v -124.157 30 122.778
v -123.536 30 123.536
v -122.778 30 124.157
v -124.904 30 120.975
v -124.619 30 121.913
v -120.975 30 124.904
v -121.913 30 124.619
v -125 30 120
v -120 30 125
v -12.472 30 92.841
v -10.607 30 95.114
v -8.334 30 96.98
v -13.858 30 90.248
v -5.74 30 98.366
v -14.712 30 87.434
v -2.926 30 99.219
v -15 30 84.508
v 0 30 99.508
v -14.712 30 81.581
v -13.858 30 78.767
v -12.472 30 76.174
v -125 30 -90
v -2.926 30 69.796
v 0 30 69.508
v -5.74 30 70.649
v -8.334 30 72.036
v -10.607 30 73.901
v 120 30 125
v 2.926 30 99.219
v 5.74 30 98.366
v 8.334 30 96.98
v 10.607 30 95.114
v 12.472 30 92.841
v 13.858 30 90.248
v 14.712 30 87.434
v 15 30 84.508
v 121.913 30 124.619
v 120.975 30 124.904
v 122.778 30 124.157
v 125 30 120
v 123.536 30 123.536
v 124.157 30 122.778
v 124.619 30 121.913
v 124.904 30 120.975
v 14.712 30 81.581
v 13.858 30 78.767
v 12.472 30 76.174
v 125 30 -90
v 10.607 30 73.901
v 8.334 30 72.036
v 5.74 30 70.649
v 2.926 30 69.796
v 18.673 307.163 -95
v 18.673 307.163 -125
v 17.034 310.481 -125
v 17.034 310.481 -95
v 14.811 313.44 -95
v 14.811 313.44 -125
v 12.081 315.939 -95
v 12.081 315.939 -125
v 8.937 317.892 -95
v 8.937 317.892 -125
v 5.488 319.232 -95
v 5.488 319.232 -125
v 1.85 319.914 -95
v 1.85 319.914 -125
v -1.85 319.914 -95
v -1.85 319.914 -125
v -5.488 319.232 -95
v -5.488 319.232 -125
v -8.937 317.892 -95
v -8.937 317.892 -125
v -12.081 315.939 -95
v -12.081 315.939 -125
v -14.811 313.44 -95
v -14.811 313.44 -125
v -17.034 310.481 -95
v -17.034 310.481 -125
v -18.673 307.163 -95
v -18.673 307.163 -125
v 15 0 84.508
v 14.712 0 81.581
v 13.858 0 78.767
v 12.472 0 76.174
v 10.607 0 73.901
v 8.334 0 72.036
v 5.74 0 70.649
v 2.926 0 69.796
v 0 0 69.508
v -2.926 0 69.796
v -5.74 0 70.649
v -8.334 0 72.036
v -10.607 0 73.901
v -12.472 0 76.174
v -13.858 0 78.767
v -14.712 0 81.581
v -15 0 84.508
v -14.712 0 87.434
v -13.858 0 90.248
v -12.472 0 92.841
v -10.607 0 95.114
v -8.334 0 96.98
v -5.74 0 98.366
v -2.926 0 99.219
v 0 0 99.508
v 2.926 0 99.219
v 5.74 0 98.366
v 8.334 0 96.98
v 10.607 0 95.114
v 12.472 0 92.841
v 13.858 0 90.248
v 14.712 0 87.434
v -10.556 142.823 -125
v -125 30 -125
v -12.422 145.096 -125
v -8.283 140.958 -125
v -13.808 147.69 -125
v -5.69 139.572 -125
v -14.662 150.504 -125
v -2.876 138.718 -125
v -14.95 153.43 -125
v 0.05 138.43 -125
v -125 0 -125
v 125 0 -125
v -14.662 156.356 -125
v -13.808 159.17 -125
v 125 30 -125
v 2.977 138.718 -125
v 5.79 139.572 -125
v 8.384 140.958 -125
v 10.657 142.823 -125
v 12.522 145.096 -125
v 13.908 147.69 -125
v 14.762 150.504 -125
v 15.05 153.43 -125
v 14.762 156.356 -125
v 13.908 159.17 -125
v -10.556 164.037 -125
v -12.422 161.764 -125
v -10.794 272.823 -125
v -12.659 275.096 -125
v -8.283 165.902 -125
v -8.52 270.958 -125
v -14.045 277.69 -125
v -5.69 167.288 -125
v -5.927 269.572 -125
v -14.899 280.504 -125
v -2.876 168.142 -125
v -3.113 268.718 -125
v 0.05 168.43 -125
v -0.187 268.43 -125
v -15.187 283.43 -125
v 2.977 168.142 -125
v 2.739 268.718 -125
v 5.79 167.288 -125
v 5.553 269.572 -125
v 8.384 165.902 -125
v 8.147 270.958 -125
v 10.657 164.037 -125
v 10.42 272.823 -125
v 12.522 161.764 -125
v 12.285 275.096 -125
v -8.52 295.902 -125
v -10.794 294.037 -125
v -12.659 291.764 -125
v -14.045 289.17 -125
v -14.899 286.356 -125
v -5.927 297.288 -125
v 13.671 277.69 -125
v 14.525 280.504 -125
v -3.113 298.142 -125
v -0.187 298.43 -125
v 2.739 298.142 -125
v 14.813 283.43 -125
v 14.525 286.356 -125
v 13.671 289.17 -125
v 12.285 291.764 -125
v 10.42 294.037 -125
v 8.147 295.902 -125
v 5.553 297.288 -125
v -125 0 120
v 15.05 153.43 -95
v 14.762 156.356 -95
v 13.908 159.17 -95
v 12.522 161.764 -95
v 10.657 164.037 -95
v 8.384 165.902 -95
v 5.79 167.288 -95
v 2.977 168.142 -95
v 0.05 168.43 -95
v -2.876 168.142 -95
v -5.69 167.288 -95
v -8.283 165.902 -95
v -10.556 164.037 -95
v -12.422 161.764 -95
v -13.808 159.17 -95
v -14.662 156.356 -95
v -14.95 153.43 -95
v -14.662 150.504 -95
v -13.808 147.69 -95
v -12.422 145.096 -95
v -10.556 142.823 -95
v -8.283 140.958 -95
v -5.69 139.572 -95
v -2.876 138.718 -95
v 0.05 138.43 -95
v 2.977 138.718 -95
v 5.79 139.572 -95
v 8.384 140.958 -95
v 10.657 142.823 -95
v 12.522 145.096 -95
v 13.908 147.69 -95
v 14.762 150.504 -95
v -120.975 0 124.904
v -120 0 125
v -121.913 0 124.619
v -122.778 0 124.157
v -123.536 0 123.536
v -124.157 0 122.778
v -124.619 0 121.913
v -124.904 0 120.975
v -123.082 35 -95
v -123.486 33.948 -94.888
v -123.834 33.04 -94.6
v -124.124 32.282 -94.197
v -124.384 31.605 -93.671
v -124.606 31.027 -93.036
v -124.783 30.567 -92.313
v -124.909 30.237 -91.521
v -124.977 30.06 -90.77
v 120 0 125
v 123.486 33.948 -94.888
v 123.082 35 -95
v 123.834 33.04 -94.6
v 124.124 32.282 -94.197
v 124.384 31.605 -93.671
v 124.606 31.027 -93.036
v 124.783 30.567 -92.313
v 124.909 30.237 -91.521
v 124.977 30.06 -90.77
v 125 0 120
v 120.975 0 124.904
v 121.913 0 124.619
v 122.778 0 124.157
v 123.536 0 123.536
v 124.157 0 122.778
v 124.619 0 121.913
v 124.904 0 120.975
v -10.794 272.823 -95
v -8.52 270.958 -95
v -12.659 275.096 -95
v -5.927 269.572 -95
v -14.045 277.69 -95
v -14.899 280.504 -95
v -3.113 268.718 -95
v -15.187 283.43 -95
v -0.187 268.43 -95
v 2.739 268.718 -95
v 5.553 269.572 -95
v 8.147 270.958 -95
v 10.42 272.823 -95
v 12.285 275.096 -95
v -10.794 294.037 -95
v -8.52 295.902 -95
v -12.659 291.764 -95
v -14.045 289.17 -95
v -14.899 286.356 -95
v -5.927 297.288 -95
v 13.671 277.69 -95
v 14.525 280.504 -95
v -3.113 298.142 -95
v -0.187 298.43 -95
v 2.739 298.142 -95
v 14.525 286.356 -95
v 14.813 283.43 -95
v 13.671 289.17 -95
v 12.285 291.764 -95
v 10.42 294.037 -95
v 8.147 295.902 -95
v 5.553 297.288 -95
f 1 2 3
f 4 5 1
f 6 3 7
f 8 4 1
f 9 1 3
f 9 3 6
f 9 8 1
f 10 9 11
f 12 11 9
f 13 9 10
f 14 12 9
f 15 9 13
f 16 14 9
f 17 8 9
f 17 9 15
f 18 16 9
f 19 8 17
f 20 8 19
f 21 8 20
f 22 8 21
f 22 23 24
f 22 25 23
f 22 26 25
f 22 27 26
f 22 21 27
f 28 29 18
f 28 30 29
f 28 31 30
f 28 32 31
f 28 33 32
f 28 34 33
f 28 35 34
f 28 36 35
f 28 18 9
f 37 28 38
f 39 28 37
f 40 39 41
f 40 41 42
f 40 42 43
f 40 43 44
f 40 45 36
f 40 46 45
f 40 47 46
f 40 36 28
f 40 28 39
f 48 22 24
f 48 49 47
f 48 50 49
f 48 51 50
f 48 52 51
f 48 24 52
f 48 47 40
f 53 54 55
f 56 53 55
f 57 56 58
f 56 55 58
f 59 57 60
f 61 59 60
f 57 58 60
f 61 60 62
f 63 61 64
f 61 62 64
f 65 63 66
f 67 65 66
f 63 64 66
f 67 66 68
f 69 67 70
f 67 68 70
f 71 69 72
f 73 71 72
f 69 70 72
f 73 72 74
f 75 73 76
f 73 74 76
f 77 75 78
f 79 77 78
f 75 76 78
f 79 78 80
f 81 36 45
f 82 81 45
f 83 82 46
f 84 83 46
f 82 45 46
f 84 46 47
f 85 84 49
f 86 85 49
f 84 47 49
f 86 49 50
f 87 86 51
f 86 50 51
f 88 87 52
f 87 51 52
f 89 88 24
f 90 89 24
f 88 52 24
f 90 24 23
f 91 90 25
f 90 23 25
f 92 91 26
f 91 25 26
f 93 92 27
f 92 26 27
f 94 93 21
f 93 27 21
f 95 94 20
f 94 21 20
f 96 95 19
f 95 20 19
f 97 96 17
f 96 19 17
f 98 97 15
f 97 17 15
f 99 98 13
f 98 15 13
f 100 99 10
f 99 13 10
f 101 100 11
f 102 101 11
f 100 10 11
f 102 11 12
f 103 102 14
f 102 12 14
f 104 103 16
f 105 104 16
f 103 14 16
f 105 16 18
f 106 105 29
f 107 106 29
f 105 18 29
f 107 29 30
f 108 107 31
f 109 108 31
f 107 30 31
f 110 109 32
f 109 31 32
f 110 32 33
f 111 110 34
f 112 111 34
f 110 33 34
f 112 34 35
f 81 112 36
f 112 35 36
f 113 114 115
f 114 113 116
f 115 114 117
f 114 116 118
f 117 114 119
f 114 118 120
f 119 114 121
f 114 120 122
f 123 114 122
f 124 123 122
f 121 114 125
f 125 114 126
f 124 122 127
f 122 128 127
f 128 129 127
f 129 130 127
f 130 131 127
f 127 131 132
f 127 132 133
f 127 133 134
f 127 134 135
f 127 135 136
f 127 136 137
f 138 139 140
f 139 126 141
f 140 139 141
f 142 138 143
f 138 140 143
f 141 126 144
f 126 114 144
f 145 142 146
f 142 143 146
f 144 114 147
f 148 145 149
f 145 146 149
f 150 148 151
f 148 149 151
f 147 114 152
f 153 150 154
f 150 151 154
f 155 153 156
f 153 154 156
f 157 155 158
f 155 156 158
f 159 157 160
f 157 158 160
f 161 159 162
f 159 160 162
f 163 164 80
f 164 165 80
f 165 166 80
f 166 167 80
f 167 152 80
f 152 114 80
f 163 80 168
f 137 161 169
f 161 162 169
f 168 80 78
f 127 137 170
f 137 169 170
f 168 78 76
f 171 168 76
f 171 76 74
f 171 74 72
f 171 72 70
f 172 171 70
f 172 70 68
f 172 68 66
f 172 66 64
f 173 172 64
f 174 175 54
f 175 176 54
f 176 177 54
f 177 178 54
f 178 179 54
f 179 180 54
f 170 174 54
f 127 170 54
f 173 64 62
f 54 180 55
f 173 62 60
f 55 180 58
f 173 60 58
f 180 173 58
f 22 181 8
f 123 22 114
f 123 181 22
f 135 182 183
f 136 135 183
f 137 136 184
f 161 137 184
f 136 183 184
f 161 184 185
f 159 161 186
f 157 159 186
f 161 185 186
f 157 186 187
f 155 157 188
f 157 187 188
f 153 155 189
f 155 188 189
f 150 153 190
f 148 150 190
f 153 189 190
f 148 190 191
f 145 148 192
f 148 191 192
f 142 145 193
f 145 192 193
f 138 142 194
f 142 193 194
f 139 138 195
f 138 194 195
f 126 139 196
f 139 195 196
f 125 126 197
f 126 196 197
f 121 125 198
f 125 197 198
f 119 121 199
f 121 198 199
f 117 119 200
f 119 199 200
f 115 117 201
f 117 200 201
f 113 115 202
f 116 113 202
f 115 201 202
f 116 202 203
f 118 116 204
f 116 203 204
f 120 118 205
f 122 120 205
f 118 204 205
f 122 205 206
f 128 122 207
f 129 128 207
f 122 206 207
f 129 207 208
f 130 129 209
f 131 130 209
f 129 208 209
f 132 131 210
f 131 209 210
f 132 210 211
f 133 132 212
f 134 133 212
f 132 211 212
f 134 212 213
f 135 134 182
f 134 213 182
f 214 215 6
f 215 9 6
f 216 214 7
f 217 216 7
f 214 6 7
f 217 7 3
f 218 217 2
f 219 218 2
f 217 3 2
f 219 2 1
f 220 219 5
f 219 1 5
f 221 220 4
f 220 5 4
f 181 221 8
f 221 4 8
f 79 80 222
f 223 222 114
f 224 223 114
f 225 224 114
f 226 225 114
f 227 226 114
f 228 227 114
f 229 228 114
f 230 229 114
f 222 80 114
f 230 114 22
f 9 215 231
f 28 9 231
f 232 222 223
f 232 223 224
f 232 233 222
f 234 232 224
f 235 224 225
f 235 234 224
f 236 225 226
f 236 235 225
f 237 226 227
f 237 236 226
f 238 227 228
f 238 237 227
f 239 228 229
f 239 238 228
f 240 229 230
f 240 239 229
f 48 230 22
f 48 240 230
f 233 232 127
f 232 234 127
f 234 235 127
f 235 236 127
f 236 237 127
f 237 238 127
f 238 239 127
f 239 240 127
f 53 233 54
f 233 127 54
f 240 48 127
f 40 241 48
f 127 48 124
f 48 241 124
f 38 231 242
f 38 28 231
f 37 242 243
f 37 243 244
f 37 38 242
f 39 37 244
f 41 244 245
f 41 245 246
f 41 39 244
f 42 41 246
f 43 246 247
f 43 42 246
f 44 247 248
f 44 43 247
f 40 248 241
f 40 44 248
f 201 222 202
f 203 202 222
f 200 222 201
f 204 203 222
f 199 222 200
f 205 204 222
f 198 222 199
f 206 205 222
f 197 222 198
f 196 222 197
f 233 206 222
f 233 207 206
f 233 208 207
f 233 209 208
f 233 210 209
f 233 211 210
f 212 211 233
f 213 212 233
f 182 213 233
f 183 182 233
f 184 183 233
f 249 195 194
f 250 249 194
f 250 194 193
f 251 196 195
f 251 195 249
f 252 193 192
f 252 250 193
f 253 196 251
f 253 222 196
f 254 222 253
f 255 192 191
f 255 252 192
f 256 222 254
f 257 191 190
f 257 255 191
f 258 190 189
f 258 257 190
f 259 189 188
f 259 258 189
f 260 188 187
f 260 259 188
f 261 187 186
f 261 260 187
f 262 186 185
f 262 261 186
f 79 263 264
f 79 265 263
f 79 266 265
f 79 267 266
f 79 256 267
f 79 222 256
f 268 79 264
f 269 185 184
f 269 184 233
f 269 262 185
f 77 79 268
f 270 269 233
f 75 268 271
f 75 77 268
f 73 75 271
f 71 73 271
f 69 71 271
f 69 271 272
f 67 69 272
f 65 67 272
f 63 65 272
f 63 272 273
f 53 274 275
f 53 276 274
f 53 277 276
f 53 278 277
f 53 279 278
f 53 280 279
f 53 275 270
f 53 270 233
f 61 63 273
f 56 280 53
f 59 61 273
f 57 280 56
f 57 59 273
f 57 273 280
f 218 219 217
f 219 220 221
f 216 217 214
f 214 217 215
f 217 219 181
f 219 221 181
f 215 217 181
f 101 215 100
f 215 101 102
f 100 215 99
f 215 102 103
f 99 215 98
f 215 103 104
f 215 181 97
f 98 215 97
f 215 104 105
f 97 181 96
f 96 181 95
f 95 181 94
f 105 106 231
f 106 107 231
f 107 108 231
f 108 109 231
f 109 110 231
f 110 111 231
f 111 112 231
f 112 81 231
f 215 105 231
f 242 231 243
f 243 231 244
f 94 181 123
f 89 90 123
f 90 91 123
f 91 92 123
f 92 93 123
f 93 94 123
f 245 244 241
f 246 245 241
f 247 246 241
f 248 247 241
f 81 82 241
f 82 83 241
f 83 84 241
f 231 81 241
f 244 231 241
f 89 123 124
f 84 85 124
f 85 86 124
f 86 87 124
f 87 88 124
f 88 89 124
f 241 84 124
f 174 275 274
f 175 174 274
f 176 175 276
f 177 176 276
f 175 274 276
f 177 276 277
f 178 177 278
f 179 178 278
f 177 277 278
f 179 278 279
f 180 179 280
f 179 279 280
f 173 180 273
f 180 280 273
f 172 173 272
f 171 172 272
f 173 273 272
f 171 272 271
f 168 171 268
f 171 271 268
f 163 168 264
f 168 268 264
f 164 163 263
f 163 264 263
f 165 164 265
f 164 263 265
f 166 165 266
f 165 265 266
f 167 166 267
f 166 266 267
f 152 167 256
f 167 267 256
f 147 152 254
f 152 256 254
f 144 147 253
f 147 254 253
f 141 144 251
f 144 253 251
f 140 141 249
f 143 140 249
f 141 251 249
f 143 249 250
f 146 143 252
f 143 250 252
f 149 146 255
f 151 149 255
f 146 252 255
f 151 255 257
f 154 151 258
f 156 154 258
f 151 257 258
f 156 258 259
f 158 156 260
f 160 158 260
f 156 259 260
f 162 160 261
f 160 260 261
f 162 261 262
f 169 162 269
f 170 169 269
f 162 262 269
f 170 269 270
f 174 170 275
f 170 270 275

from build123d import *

# Parameters (mm, degrees)
SKETCH1_W           = 250
SKETCH1_H           = 250
EXTRUDE1_DEPTH      = 30
EXTRUDE2_DEPTH      = 30
FILLET1_R           = 5
FILLET2_R           = 5
SKETCH14_R          = 15
CUT_EXTRUDE1_DEPTH  = 30
SKETCH16_R          = 5.416442209
BOSS_EXTRUDE4_DEPTH = 30
SKETCH17_R          = 15
CUT_EXTRUDE2_DEPTH  = 30


with BuildPart() as part:
    # Sketch1 → Extrude1 (new body)
    with BuildSketch(Plane(origin=(0, 0, 0), x_dir=(1, 0, 0), z_dir=(0, 1, 0))):
        Rectangle(SKETCH1_W, SKETCH1_H)
    extrude(amount=EXTRUDE1_DEPTH)

    # Sketch3 → Extrude2 (add)
    with BuildSketch(Plane(origin=(0, 0, -125), x_dir=(-1, 0, 0), z_dir=(0, 0, -1))):
        with BuildLine():
            Line((-125, 30), (-18.673100048, 307.163472244))
            ThreePointArc((-18.673100048, 307.163472244), (0, 320), (18.673100048, 307.163472244))
            Line((18.673100048, 307.163472244), (125, 30))
            Line((125, 30), (-125, 30))
        make_face()
    extrude(amount=-EXTRUDE2_DEPTH)

    # Fillet1
    fillet1_edges = [part.edges().sort_by_distance(p)[0] for p in [
        (0, 30, -95),
    ]]
    fillet(fillet1_edges, radius=FILLET1_R)

    # Fillet2
    fillet2_edges = [part.edges().sort_by_distance(p)[0] for p in [
        (-125, 15, 125),
        (125, 15, 125),
    ]]
    fillet(fillet2_edges, radius=FILLET2_R)

    # Sketch14 → Cut-Extrude1 (cut)
    with BuildSketch(Plane.XY.offset(-95)):
        with Locations((0.050224631, 153.429955133)):
            Circle(SKETCH14_R)
        with Locations((-0.186934905, 283.429955133)):
            Circle(SKETCH14_R)
    extrude(amount=-CUT_EXTRUDE1_DEPTH, mode=Mode.SUBTRACT)

    # Sketch16 → Boss-Extrude4 (add)
    with BuildSketch(Plane(origin=(-1.938008544, 0, -95), x_dir=(1, 0, 0), z_dir=(0, 0, 1))):
        with Locations((1.836864398, 213.31214362)):
            Circle(SKETCH16_R)
    extrude(amount=-BOSS_EXTRUDE4_DEPTH)

    # Sketch17 → Cut-Extrude2 (cut)
    with BuildSketch(Plane(origin=(0, 30, 0), x_dir=(1, 0, 0), z_dir=(0, 1, 0))):
        with Locations((0, -84.507674079)):
            Circle(SKETCH17_R)
    extrude(amount=-CUT_EXTRUDE2_DEPTH, mode=Mode.SUBTRACT)


solid = part.part
